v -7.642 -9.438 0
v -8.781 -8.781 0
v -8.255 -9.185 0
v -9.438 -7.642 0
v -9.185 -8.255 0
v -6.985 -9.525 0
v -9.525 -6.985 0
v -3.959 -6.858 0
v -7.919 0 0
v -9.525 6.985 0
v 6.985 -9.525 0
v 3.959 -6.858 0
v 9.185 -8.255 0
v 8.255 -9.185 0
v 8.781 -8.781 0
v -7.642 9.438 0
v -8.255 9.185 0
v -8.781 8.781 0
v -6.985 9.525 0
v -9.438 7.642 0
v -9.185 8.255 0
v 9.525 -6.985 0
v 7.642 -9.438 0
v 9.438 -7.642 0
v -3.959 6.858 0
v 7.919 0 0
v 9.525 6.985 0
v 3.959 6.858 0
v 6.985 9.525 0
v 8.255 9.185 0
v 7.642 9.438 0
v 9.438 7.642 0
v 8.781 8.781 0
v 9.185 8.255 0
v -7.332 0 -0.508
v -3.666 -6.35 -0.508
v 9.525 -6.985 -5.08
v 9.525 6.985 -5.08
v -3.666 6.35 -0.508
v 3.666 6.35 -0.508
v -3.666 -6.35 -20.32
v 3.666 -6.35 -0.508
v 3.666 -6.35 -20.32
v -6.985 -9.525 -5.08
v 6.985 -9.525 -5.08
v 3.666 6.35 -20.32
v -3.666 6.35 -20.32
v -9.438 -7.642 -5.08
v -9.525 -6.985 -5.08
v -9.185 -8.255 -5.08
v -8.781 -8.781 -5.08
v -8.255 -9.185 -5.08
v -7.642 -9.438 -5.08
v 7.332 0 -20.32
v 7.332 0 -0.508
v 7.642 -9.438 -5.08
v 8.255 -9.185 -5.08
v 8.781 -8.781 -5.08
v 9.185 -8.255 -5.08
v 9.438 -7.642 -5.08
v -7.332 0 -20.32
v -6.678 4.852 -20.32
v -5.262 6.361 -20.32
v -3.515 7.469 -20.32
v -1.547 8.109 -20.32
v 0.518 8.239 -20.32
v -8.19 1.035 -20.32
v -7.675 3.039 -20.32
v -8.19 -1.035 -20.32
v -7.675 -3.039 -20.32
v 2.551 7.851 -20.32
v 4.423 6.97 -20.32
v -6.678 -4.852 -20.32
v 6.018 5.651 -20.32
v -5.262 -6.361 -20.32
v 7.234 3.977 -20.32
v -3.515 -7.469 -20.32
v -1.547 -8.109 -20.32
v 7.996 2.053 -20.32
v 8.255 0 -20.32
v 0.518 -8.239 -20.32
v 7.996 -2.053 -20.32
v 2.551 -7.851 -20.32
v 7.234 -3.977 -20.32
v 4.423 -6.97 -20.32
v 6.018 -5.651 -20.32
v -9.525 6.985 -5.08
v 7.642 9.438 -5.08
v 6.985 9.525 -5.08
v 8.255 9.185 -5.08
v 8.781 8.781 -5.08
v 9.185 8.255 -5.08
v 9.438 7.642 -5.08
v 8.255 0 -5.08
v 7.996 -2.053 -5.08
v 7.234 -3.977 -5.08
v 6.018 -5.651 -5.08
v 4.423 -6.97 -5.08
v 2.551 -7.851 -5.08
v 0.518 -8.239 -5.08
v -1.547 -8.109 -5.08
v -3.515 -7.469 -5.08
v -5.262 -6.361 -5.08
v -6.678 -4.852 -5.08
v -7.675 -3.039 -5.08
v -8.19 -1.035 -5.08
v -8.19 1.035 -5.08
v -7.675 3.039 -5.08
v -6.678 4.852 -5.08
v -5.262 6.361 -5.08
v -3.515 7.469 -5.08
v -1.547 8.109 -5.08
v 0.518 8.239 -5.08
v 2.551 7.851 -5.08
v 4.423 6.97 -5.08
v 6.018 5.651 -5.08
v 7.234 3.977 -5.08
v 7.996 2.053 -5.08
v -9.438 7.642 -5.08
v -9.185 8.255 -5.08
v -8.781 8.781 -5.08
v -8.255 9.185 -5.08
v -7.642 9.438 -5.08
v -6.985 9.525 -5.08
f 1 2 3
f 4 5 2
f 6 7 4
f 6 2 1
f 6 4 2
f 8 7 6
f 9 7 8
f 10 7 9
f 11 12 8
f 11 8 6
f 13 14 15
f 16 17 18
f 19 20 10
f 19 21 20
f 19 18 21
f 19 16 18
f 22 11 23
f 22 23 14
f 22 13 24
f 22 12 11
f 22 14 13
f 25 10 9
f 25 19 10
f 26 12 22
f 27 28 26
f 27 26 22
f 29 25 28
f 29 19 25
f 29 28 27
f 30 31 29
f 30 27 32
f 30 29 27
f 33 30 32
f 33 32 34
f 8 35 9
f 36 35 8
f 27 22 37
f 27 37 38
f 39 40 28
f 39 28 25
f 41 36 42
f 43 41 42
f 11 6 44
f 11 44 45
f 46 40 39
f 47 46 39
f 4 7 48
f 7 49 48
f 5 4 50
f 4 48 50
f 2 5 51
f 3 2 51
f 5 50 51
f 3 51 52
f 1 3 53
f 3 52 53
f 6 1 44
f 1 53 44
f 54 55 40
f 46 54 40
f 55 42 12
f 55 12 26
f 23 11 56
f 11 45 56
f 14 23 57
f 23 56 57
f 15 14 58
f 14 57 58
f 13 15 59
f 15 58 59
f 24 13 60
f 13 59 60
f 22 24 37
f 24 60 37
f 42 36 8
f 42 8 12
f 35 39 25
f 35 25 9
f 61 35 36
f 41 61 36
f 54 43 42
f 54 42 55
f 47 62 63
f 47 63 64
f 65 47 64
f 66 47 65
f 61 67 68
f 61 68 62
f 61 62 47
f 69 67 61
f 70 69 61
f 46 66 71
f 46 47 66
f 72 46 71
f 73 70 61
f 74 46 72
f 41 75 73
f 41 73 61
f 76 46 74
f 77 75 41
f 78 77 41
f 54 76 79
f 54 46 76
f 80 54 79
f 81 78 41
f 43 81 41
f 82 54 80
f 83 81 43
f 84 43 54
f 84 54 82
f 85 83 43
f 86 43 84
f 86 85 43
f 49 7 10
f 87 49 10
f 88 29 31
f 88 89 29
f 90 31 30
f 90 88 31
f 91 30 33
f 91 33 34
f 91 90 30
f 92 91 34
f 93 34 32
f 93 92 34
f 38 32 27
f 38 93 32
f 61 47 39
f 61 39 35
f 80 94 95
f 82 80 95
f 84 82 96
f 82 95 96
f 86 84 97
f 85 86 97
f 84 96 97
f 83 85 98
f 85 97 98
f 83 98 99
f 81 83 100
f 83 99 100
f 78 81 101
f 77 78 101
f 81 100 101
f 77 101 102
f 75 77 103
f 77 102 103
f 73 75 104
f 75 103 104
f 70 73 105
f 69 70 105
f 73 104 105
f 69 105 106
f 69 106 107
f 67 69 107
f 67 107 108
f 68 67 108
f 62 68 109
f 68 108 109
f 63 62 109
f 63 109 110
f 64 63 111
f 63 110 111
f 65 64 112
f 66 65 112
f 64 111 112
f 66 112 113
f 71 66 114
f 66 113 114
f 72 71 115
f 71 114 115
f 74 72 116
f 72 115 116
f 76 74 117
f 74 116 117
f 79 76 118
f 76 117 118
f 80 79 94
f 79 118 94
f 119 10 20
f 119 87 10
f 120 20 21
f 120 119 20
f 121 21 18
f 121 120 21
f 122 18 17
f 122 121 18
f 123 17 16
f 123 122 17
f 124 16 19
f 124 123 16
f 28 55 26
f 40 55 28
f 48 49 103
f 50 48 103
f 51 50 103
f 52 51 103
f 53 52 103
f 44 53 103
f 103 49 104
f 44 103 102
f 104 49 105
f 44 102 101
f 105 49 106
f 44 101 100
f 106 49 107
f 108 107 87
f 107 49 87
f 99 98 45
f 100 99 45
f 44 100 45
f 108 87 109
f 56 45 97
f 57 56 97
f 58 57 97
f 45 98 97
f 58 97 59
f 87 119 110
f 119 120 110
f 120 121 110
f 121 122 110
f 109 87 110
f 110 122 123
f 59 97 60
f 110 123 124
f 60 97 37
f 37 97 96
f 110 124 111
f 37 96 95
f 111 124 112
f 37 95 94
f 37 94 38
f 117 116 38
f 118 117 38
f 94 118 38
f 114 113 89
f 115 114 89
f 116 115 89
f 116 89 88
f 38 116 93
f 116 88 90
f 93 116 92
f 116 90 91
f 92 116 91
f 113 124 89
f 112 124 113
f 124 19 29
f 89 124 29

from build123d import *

# Parameters (mm, degrees)
SKETCH1_W           = 19.05
SKETCH1_H           = 19.05
BOSS_EXTRUDE1_DEPTH = 5.08
SKETCH2_R           = 8.255
BOSS_EXTRUDE2_DEPTH = 15.24
CUT_EXTRUDE1_DEPTH  = 25.379369352
FILLET1_R           = 2.54
CHAMFER1_SIZE       = 0.508


with BuildPart() as part:
    # Sketch1 → Boss-Extrude1 (new body)
    with BuildSketch(Plane.XY):
        Rectangle(SKETCH1_W, SKETCH1_H)
    extrude(amount=-BOSS_EXTRUDE1_DEPTH)

    # Sketch2 → Boss-Extrude2 (add)
    with BuildSketch(Plane(origin=(0, 0, -5.08), x_dir=(-1, 0, 0), z_dir=(0, 0, -1))):
        with Locations(Location((0, 0, 0), (0, 0, 180))):
            Circle(SKETCH2_R)
    extrude(amount=BOSS_EXTRUDE2_DEPTH)

    # Sketch3 → Cut-Extrude1 (cut, through all)
    with BuildSketch(Plane.XY):
        Polygon((3.666174209, 6.35), (-3.666174209, 6.35), (-7.332348419, 0), (-3.666174209, -6.35), (3.666174209, -6.35), (7.332348419, 0), align=None)
    extrude(amount=-CUT_EXTRUDE1_DEPTH, mode=Mode.SUBTRACT)

    # Fillet1
    fillet1_edges = [part.edges().sort_by_distance(p)[0] for p in [
        (9.525, -9.525, -2.54),
        (-9.525, -9.525, -2.54),
        (-9.525, 9.525, -2.54),
        (9.525, 9.525, -2.54),
    ]]
    fillet(fillet1_edges, radius=FILLET1_R)

    # Chamfer1
    chamfer1_edges = [part.edges().sort_by_distance(p)[0] for p in [
        (5.499261314, 3.175, 0),
        (0, 6.35, 0),
        (-5.499261314, 3.175, 0),
        (-5.499261314, -3.175, 0),
        (0, -6.35, 0),
        (5.499261314, -3.175, 0),
    ]]
    chamfer(chamfer1_edges, length=CHAMFER1_SIZE)


solid = part.part
